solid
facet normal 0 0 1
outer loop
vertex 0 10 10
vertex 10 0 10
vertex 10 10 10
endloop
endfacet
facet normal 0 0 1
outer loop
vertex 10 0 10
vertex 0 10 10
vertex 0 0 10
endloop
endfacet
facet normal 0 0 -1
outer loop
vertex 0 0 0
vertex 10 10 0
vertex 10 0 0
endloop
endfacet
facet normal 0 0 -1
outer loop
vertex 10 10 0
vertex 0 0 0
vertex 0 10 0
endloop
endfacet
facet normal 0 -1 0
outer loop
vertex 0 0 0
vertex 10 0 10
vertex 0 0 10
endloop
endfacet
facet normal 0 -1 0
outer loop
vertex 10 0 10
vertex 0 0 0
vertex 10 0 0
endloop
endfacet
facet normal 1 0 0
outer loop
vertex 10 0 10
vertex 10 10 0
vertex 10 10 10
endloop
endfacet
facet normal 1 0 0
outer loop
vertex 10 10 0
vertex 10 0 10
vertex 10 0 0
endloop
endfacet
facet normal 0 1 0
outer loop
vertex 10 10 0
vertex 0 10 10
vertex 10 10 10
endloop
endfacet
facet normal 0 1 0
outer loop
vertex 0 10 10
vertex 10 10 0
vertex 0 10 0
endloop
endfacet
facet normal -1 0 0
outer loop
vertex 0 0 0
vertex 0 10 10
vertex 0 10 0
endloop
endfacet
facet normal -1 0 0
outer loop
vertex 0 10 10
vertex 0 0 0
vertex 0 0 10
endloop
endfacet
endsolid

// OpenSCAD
name = "cube";
x = 10;
y = 10;
z = 10;
diameter = 10;

module echo_cam() {
    echo(
        str(
            "\n",
            round($vpt[0]),",",round($vpt[1]),",",round($vpt[2]),",",
            round($vpr[0]),",",round($vpr[1]),",",round($vpr[2]),",",
            round($vpd),
            "\n"
        )
    );
}

echo_cam();

if (name == "cube")
    cube([x, y, z]);
else if (name == "cylinder")
    cylinder(d = diameter, h = z);
else if (name == "sphere")
    sphere(d = diameter);
